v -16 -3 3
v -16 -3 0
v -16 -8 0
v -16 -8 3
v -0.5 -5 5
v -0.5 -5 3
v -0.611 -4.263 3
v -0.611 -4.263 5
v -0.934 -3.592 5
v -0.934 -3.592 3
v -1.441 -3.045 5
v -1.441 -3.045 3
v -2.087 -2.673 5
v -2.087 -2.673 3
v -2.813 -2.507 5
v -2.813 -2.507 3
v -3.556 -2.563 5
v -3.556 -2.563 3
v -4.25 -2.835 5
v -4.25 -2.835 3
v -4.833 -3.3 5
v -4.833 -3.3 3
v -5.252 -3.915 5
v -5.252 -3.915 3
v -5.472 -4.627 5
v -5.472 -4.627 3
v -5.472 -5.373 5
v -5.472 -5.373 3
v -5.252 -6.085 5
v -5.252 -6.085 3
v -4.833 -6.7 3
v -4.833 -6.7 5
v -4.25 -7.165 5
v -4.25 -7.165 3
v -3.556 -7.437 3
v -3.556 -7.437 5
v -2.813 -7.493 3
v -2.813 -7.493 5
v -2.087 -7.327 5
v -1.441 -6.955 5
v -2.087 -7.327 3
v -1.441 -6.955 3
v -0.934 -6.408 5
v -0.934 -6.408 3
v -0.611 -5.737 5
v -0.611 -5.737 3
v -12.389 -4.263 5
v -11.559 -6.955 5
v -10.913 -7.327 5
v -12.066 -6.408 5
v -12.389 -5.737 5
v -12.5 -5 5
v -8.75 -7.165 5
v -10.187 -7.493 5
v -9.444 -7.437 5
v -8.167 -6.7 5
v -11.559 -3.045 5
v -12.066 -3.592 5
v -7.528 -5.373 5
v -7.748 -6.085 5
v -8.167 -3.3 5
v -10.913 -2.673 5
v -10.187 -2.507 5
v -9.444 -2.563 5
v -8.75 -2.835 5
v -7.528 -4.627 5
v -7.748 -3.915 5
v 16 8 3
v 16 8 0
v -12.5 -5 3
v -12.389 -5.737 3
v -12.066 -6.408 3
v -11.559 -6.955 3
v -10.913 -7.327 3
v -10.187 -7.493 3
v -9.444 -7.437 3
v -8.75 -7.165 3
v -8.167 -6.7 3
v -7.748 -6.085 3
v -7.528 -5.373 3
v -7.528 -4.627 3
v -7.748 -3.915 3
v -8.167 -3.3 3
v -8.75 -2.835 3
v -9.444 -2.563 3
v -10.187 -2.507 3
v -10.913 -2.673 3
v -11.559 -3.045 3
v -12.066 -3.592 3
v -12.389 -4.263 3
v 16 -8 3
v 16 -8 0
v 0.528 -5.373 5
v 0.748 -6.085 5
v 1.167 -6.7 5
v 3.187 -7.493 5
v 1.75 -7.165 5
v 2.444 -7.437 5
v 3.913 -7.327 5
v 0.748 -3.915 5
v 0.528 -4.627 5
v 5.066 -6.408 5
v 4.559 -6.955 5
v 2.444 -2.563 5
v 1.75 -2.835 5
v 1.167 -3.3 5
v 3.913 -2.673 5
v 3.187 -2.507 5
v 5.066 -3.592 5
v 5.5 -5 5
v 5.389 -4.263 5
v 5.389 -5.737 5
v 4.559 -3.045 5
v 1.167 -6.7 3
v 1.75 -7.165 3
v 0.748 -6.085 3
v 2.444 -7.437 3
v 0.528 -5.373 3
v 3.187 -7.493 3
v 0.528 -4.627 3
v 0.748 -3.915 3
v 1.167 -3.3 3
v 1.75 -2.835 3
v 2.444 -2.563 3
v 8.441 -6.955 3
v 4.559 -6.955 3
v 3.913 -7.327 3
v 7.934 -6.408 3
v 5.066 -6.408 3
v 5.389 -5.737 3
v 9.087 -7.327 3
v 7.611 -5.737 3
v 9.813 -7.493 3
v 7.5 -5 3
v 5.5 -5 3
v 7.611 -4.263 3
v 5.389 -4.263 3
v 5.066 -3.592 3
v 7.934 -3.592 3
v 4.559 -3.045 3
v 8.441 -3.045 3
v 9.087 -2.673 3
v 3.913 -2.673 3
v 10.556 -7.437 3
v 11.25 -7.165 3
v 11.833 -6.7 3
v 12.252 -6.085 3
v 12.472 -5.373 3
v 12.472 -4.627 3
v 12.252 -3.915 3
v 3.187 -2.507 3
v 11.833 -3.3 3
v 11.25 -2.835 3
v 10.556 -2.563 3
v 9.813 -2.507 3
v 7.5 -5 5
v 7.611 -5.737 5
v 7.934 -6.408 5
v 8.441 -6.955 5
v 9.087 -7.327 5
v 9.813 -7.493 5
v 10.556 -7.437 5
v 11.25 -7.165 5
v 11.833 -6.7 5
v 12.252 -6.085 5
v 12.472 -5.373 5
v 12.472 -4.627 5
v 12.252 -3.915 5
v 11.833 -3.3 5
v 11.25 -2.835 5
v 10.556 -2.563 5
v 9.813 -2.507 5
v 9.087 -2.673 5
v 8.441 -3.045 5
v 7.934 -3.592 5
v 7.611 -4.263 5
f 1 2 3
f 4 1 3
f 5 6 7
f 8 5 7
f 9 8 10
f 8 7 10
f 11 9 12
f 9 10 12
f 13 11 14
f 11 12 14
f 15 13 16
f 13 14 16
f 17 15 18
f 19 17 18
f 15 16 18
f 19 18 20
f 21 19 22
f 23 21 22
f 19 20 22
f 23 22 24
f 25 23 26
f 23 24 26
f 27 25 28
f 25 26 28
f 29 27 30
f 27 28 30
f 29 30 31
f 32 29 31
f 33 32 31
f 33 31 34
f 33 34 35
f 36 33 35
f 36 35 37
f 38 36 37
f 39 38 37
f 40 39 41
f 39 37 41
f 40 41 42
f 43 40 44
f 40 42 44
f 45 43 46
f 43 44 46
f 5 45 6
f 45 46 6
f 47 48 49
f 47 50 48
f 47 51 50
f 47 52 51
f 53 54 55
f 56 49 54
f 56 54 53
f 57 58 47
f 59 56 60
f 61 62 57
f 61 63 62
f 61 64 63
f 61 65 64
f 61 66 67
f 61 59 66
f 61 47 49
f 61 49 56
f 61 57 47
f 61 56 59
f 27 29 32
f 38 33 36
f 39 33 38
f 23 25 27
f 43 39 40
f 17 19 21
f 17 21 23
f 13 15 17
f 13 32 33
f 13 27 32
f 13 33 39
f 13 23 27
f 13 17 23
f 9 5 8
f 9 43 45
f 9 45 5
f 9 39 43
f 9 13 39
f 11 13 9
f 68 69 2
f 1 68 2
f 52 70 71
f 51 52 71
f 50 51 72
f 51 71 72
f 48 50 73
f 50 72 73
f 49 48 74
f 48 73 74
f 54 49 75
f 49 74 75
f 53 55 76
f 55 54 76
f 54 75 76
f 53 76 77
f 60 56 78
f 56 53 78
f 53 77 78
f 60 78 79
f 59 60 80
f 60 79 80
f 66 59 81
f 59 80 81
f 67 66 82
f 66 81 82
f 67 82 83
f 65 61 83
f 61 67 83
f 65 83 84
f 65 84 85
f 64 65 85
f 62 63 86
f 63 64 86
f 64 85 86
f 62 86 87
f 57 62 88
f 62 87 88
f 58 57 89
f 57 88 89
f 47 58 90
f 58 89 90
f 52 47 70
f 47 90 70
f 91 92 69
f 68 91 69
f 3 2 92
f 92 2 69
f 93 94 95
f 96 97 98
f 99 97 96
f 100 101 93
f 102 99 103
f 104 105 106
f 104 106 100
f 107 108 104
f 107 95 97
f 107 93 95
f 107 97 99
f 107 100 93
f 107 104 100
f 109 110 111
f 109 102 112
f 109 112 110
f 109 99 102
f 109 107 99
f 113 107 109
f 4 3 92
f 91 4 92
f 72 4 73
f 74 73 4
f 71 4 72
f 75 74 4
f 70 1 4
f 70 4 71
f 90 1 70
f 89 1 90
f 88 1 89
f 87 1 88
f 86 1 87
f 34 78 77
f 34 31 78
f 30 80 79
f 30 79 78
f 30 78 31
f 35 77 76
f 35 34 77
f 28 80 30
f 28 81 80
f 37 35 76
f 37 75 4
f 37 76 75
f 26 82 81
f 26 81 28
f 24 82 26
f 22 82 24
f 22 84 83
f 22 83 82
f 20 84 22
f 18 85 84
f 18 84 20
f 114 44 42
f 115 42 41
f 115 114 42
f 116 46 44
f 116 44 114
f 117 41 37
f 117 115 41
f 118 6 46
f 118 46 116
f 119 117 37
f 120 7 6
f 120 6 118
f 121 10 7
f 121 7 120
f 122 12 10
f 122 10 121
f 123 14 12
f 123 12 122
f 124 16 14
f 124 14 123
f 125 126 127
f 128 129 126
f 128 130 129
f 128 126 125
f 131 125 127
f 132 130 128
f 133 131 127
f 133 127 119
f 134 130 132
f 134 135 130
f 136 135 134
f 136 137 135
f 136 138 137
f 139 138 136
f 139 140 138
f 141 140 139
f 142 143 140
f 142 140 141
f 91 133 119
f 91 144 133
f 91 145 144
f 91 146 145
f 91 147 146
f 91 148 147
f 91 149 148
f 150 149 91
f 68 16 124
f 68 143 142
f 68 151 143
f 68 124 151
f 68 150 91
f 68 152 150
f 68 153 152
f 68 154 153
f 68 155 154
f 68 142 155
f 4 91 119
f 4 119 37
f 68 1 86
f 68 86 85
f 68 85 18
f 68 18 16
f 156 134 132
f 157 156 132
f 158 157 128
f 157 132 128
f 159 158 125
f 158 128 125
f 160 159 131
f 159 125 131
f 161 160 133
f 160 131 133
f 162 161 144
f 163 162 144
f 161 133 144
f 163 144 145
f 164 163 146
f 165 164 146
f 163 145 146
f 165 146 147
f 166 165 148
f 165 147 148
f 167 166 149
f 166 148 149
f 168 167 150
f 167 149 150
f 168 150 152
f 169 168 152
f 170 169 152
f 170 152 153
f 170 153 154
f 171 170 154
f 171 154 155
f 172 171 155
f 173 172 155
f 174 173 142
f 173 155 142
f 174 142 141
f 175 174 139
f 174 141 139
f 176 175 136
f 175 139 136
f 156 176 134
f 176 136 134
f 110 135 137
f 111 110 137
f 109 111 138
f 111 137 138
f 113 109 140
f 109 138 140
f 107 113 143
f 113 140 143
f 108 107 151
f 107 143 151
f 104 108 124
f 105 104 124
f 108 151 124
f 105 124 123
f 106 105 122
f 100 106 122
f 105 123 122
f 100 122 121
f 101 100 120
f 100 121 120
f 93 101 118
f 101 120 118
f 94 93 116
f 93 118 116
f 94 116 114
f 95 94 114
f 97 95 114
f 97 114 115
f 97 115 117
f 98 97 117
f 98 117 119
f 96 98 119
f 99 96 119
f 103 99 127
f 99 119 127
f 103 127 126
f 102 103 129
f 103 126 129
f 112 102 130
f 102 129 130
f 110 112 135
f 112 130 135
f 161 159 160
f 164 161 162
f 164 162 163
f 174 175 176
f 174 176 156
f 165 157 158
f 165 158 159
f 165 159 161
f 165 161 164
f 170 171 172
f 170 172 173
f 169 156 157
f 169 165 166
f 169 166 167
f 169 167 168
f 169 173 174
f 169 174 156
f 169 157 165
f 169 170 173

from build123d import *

# Parameters (mm, degrees)
F1_DEPTH = 3
F3_DEPTH = 2
F4_DEPTH = 2


# Not quite as in the source:
# - a feature names something its author has since deleted; it is built from what else it names


with BuildPart() as f1:
    # F0 (on Top) → F1 (new body)
    with BuildSketch(Plane.XY):
        Polygon((-16, -8), (16, -8), (16, 8), (-16, -3), align=None)
    extrude(amount=F1_DEPTH)

    # F2 (on face) → F3 (join)
    with BuildSketch(Plane.XY.offset(3)):
        with BuildLine():
            Line((7.5, -5), (12.5, -5))
            ThreePointArc((12.5, -5), (10, -2.5), (7.5, -5))
        make_face()
        with BuildLine():
            ThreePointArc((7.5, -5), (10, -7.5), (12.5, -5))
            Line((12.5, -5), (7.5, -5))
        make_face()
        with BuildLine():
            ThreePointArc((-7.5, -5), (-10, -2.5), (-12.5, -5))
            Line((-12.5, -5), (-7.5, -5))
        make_face()
        with BuildLine():
            Line((-7.5, -5), (-12.5, -5))
            ThreePointArc((-12.5, -5), (-10, -7.5), (-7.5, -5))
        make_face()
    extrude(amount=F3_DEPTH)

    # F2 (on face) → F4 (join)
    with BuildSketch(Plane.XY.offset(3)):
        with BuildLine():
            Line((7.5, -5), (12.5, -5))
            ThreePointArc((12.5, -5), (10, -2.5), (7.5, -5))
        make_face()
        with BuildLine():
            ThreePointArc((-12.5, -5), (-10, -7.5), (-7.5, -5))
            Line((-7.5, -5), (-12.5, -5))
        make_face()
        with BuildLine():
            Line((-12.5, -5), (-7.5, -5))
            ThreePointArc((-7.5, -5), (-10, -2.5), (-12.5, -5))
        make_face()
        with BuildLine():
            ThreePointArc((-5.5, -5), (-3, -7.5), (-0.5, -5))
            Line((-0.5, -5), (-5.5, -5))
        make_face()
        with BuildLine():
            Line((-5.5, -5), (-0.5, -5))
            ThreePointArc((-0.5, -5), (-3, -2.5), (-5.5, -5))
        make_face()
        with BuildLine():
            ThreePointArc((0.5, -5), (3, -7.5), (5.5, -5))
            Line((5.5, -5), (0.5, -5))
        make_face()
        with BuildLine():
            Line((0.5, -5), (5.5, -5))
            ThreePointArc((5.5, -5), (3, -2.5), (0.5, -5))
        make_face()
        with BuildLine():
            ThreePointArc((7.5, -5), (10, -7.5), (12.5, -5))
            Line((12.5, -5), (7.5, -5))
        make_face()
    extrude(amount=F4_DEPTH)


solid = f1.part
